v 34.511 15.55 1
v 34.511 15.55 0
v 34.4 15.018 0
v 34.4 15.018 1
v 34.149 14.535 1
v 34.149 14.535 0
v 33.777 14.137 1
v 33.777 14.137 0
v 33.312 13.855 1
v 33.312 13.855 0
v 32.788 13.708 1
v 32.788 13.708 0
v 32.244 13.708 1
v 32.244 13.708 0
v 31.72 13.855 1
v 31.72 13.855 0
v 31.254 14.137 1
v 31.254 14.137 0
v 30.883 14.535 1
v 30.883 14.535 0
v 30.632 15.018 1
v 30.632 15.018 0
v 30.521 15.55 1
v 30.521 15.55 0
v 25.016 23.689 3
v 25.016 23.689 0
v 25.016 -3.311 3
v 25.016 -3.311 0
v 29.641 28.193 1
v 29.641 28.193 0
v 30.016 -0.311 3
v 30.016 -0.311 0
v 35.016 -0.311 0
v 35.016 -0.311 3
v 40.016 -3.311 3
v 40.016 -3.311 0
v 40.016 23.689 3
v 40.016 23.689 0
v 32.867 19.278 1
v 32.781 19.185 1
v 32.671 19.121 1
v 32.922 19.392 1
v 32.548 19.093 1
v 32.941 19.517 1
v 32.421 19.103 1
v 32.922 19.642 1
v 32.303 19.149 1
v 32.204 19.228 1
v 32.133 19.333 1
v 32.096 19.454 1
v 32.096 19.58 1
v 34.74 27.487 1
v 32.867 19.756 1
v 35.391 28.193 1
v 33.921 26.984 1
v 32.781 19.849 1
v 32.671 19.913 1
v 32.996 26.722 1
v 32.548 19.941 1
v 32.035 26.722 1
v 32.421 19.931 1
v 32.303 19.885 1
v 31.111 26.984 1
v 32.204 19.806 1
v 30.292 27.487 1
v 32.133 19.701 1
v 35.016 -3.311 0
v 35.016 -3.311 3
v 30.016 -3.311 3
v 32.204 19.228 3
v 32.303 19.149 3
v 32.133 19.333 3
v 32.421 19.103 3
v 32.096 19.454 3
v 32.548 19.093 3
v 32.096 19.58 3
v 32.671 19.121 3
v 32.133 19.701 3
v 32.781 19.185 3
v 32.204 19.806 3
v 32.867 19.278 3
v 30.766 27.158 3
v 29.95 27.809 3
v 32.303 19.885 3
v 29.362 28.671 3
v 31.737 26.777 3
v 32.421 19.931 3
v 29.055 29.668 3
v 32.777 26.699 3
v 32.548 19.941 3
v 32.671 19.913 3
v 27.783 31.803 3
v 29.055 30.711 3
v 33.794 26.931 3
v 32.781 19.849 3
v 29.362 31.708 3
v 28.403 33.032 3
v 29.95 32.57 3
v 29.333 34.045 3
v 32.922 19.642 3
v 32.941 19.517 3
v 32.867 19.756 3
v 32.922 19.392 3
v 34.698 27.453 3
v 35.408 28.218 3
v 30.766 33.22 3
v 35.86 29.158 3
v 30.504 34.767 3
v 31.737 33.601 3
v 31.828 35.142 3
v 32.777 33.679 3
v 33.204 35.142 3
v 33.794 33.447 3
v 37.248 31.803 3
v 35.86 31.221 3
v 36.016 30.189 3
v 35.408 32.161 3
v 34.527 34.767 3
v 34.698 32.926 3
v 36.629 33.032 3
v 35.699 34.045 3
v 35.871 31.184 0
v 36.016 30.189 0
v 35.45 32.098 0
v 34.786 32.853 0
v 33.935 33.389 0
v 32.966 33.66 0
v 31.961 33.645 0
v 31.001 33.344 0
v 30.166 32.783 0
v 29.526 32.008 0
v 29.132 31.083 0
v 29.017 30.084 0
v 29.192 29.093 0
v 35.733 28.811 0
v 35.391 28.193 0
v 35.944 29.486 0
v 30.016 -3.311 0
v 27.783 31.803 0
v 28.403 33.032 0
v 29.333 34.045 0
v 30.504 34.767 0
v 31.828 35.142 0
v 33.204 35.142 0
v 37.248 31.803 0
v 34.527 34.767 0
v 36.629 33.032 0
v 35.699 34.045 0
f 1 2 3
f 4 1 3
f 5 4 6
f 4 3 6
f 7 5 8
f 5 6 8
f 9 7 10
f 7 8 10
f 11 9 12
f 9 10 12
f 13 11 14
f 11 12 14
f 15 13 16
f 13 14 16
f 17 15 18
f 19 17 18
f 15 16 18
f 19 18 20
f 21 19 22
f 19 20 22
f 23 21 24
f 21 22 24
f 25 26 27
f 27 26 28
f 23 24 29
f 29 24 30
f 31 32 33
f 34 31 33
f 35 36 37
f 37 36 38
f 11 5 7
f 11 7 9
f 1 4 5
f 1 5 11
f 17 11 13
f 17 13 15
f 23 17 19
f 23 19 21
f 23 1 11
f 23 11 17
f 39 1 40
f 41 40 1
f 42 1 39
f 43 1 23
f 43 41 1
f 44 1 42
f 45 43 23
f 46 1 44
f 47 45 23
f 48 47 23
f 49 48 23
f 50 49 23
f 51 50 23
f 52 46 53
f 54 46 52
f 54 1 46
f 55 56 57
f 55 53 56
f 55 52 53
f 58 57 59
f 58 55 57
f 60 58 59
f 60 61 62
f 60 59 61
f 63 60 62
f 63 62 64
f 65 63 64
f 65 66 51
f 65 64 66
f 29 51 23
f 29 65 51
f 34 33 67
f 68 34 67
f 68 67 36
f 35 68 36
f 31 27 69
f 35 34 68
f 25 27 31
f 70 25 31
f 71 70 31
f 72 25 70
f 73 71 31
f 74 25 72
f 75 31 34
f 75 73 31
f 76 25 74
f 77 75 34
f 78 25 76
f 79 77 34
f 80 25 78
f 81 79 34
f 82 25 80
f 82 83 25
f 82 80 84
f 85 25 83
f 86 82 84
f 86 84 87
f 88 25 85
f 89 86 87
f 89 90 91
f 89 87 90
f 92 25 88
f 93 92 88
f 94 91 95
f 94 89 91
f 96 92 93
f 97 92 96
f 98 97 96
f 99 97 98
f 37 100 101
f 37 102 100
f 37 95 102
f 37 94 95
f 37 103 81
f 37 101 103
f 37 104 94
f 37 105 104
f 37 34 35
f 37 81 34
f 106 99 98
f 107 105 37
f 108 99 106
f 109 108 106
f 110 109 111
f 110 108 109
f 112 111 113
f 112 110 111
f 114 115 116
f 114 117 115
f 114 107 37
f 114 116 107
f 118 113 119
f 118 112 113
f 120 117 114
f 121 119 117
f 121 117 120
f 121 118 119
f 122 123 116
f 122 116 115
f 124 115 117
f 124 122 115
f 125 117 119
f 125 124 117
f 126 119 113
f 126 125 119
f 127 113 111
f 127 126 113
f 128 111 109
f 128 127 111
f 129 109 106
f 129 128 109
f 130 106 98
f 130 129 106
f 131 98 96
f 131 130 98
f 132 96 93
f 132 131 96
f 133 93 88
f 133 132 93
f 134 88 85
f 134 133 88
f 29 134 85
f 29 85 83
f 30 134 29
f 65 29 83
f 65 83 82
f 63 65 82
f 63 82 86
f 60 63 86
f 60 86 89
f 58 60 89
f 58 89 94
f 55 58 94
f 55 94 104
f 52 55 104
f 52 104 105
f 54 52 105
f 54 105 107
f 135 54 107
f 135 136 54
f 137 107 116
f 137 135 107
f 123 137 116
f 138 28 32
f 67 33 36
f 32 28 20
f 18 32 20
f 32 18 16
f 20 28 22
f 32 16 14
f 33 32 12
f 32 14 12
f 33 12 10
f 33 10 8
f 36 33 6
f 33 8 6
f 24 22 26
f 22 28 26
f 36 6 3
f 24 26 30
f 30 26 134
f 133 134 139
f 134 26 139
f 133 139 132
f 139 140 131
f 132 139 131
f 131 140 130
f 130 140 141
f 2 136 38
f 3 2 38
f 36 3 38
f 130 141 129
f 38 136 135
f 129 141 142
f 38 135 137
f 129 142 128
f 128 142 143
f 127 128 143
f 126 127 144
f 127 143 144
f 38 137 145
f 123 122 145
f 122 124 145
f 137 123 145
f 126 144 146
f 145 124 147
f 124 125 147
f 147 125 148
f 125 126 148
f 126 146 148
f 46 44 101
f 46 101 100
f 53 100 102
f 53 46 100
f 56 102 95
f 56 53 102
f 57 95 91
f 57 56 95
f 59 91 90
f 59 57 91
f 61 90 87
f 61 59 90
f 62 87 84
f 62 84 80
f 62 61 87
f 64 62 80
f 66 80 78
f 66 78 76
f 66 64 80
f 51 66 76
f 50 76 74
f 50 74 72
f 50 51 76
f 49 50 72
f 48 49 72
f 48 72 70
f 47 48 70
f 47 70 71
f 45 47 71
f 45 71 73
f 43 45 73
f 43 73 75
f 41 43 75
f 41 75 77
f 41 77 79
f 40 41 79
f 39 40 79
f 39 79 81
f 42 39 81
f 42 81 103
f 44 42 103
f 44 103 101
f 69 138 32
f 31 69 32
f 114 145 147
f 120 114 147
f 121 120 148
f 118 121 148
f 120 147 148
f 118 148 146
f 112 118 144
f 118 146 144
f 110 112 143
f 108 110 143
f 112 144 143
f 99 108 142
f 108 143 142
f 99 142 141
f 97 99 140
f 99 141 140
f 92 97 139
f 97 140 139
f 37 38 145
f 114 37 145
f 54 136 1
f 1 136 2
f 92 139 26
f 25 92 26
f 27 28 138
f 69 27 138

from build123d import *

# Parameters (mm, degrees)
CORTE_EXTERIOR_R        = 0.425
CORTE_EXTERIOR_R_2      = 3.500002336
SALIENTE_EXTRUIR1_DEPTH = 3
CORTAR_EXTRUIR1_DEPTH   = 1


with BuildPart() as part:
    # Corte exterior → Saliente-Extruir1 (new body)
    with BuildSketch(Plane.XY):
        with BuildLine():
            Line((40.01577693, -3.310783785), (40.01577693, 10.689216215))
            Line((40.01577693, 10.689216215), (40.01577693, 23.689216215))
            Line((40.01577693, 23.689216215), (37.248055694, 31.80338402))
            ThreePointArc((37.248055694, 31.80338402), (32.51577693, 35.189216215), (27.783498166, 31.80338402))
            Line((27.783498166, 31.80338402), (25.01577693, 23.689216215))
            Line((25.01577693, 23.689216215), (25.01577693, -3.310783785))
            Line((25.01577693, -3.310783785), (30.01577693, -3.310783785))
            Line((30.01577693, -3.310783785), (30.01577693, -0.310783785))
            Line((30.01577693, -0.310783785), (35.01577693, -0.310783785))
            Line((35.01577693, -0.310783785), (35.01577693, -3.310783785))
            Line((35.01577693, -3.310783785), (40.01577693, -3.310783785))
        make_face()
        with Locations((32.51577693, 19.516986762)):
            Circle(CORTE_EXTERIOR_R, mode=Mode.SUBTRACT)
        with Locations((32.51577693, 30.189216215)):
            Circle(CORTE_EXTERIOR_R_2, mode=Mode.SUBTRACT)
    extrude(amount=SALIENTE_EXTRUIR1_DEPTH)

    # Grabado Superficie → Cortar-Extruir1 (cut)
    with BuildSketch(Plane.XY):
        with BuildLine():
            Line((30.520602357, 15.55036945), (29.64077693, 28.193122191))
            ThreePointArc((29.64077693, 28.193122191), (32.51577693, 26.689213879), (35.39077693, 28.193122191))
            Line((35.39077693, 28.193122191), (34.510951503, 15.55036945))
            ThreePointArc((34.510951503, 15.55036945), (32.51577693, 13.689216215), (30.520602357, 15.55036945))
        make_face()
    extrude(amount=CORTAR_EXTRUIR1_DEPTH, mode=Mode.SUBTRACT)


solid = part.part
